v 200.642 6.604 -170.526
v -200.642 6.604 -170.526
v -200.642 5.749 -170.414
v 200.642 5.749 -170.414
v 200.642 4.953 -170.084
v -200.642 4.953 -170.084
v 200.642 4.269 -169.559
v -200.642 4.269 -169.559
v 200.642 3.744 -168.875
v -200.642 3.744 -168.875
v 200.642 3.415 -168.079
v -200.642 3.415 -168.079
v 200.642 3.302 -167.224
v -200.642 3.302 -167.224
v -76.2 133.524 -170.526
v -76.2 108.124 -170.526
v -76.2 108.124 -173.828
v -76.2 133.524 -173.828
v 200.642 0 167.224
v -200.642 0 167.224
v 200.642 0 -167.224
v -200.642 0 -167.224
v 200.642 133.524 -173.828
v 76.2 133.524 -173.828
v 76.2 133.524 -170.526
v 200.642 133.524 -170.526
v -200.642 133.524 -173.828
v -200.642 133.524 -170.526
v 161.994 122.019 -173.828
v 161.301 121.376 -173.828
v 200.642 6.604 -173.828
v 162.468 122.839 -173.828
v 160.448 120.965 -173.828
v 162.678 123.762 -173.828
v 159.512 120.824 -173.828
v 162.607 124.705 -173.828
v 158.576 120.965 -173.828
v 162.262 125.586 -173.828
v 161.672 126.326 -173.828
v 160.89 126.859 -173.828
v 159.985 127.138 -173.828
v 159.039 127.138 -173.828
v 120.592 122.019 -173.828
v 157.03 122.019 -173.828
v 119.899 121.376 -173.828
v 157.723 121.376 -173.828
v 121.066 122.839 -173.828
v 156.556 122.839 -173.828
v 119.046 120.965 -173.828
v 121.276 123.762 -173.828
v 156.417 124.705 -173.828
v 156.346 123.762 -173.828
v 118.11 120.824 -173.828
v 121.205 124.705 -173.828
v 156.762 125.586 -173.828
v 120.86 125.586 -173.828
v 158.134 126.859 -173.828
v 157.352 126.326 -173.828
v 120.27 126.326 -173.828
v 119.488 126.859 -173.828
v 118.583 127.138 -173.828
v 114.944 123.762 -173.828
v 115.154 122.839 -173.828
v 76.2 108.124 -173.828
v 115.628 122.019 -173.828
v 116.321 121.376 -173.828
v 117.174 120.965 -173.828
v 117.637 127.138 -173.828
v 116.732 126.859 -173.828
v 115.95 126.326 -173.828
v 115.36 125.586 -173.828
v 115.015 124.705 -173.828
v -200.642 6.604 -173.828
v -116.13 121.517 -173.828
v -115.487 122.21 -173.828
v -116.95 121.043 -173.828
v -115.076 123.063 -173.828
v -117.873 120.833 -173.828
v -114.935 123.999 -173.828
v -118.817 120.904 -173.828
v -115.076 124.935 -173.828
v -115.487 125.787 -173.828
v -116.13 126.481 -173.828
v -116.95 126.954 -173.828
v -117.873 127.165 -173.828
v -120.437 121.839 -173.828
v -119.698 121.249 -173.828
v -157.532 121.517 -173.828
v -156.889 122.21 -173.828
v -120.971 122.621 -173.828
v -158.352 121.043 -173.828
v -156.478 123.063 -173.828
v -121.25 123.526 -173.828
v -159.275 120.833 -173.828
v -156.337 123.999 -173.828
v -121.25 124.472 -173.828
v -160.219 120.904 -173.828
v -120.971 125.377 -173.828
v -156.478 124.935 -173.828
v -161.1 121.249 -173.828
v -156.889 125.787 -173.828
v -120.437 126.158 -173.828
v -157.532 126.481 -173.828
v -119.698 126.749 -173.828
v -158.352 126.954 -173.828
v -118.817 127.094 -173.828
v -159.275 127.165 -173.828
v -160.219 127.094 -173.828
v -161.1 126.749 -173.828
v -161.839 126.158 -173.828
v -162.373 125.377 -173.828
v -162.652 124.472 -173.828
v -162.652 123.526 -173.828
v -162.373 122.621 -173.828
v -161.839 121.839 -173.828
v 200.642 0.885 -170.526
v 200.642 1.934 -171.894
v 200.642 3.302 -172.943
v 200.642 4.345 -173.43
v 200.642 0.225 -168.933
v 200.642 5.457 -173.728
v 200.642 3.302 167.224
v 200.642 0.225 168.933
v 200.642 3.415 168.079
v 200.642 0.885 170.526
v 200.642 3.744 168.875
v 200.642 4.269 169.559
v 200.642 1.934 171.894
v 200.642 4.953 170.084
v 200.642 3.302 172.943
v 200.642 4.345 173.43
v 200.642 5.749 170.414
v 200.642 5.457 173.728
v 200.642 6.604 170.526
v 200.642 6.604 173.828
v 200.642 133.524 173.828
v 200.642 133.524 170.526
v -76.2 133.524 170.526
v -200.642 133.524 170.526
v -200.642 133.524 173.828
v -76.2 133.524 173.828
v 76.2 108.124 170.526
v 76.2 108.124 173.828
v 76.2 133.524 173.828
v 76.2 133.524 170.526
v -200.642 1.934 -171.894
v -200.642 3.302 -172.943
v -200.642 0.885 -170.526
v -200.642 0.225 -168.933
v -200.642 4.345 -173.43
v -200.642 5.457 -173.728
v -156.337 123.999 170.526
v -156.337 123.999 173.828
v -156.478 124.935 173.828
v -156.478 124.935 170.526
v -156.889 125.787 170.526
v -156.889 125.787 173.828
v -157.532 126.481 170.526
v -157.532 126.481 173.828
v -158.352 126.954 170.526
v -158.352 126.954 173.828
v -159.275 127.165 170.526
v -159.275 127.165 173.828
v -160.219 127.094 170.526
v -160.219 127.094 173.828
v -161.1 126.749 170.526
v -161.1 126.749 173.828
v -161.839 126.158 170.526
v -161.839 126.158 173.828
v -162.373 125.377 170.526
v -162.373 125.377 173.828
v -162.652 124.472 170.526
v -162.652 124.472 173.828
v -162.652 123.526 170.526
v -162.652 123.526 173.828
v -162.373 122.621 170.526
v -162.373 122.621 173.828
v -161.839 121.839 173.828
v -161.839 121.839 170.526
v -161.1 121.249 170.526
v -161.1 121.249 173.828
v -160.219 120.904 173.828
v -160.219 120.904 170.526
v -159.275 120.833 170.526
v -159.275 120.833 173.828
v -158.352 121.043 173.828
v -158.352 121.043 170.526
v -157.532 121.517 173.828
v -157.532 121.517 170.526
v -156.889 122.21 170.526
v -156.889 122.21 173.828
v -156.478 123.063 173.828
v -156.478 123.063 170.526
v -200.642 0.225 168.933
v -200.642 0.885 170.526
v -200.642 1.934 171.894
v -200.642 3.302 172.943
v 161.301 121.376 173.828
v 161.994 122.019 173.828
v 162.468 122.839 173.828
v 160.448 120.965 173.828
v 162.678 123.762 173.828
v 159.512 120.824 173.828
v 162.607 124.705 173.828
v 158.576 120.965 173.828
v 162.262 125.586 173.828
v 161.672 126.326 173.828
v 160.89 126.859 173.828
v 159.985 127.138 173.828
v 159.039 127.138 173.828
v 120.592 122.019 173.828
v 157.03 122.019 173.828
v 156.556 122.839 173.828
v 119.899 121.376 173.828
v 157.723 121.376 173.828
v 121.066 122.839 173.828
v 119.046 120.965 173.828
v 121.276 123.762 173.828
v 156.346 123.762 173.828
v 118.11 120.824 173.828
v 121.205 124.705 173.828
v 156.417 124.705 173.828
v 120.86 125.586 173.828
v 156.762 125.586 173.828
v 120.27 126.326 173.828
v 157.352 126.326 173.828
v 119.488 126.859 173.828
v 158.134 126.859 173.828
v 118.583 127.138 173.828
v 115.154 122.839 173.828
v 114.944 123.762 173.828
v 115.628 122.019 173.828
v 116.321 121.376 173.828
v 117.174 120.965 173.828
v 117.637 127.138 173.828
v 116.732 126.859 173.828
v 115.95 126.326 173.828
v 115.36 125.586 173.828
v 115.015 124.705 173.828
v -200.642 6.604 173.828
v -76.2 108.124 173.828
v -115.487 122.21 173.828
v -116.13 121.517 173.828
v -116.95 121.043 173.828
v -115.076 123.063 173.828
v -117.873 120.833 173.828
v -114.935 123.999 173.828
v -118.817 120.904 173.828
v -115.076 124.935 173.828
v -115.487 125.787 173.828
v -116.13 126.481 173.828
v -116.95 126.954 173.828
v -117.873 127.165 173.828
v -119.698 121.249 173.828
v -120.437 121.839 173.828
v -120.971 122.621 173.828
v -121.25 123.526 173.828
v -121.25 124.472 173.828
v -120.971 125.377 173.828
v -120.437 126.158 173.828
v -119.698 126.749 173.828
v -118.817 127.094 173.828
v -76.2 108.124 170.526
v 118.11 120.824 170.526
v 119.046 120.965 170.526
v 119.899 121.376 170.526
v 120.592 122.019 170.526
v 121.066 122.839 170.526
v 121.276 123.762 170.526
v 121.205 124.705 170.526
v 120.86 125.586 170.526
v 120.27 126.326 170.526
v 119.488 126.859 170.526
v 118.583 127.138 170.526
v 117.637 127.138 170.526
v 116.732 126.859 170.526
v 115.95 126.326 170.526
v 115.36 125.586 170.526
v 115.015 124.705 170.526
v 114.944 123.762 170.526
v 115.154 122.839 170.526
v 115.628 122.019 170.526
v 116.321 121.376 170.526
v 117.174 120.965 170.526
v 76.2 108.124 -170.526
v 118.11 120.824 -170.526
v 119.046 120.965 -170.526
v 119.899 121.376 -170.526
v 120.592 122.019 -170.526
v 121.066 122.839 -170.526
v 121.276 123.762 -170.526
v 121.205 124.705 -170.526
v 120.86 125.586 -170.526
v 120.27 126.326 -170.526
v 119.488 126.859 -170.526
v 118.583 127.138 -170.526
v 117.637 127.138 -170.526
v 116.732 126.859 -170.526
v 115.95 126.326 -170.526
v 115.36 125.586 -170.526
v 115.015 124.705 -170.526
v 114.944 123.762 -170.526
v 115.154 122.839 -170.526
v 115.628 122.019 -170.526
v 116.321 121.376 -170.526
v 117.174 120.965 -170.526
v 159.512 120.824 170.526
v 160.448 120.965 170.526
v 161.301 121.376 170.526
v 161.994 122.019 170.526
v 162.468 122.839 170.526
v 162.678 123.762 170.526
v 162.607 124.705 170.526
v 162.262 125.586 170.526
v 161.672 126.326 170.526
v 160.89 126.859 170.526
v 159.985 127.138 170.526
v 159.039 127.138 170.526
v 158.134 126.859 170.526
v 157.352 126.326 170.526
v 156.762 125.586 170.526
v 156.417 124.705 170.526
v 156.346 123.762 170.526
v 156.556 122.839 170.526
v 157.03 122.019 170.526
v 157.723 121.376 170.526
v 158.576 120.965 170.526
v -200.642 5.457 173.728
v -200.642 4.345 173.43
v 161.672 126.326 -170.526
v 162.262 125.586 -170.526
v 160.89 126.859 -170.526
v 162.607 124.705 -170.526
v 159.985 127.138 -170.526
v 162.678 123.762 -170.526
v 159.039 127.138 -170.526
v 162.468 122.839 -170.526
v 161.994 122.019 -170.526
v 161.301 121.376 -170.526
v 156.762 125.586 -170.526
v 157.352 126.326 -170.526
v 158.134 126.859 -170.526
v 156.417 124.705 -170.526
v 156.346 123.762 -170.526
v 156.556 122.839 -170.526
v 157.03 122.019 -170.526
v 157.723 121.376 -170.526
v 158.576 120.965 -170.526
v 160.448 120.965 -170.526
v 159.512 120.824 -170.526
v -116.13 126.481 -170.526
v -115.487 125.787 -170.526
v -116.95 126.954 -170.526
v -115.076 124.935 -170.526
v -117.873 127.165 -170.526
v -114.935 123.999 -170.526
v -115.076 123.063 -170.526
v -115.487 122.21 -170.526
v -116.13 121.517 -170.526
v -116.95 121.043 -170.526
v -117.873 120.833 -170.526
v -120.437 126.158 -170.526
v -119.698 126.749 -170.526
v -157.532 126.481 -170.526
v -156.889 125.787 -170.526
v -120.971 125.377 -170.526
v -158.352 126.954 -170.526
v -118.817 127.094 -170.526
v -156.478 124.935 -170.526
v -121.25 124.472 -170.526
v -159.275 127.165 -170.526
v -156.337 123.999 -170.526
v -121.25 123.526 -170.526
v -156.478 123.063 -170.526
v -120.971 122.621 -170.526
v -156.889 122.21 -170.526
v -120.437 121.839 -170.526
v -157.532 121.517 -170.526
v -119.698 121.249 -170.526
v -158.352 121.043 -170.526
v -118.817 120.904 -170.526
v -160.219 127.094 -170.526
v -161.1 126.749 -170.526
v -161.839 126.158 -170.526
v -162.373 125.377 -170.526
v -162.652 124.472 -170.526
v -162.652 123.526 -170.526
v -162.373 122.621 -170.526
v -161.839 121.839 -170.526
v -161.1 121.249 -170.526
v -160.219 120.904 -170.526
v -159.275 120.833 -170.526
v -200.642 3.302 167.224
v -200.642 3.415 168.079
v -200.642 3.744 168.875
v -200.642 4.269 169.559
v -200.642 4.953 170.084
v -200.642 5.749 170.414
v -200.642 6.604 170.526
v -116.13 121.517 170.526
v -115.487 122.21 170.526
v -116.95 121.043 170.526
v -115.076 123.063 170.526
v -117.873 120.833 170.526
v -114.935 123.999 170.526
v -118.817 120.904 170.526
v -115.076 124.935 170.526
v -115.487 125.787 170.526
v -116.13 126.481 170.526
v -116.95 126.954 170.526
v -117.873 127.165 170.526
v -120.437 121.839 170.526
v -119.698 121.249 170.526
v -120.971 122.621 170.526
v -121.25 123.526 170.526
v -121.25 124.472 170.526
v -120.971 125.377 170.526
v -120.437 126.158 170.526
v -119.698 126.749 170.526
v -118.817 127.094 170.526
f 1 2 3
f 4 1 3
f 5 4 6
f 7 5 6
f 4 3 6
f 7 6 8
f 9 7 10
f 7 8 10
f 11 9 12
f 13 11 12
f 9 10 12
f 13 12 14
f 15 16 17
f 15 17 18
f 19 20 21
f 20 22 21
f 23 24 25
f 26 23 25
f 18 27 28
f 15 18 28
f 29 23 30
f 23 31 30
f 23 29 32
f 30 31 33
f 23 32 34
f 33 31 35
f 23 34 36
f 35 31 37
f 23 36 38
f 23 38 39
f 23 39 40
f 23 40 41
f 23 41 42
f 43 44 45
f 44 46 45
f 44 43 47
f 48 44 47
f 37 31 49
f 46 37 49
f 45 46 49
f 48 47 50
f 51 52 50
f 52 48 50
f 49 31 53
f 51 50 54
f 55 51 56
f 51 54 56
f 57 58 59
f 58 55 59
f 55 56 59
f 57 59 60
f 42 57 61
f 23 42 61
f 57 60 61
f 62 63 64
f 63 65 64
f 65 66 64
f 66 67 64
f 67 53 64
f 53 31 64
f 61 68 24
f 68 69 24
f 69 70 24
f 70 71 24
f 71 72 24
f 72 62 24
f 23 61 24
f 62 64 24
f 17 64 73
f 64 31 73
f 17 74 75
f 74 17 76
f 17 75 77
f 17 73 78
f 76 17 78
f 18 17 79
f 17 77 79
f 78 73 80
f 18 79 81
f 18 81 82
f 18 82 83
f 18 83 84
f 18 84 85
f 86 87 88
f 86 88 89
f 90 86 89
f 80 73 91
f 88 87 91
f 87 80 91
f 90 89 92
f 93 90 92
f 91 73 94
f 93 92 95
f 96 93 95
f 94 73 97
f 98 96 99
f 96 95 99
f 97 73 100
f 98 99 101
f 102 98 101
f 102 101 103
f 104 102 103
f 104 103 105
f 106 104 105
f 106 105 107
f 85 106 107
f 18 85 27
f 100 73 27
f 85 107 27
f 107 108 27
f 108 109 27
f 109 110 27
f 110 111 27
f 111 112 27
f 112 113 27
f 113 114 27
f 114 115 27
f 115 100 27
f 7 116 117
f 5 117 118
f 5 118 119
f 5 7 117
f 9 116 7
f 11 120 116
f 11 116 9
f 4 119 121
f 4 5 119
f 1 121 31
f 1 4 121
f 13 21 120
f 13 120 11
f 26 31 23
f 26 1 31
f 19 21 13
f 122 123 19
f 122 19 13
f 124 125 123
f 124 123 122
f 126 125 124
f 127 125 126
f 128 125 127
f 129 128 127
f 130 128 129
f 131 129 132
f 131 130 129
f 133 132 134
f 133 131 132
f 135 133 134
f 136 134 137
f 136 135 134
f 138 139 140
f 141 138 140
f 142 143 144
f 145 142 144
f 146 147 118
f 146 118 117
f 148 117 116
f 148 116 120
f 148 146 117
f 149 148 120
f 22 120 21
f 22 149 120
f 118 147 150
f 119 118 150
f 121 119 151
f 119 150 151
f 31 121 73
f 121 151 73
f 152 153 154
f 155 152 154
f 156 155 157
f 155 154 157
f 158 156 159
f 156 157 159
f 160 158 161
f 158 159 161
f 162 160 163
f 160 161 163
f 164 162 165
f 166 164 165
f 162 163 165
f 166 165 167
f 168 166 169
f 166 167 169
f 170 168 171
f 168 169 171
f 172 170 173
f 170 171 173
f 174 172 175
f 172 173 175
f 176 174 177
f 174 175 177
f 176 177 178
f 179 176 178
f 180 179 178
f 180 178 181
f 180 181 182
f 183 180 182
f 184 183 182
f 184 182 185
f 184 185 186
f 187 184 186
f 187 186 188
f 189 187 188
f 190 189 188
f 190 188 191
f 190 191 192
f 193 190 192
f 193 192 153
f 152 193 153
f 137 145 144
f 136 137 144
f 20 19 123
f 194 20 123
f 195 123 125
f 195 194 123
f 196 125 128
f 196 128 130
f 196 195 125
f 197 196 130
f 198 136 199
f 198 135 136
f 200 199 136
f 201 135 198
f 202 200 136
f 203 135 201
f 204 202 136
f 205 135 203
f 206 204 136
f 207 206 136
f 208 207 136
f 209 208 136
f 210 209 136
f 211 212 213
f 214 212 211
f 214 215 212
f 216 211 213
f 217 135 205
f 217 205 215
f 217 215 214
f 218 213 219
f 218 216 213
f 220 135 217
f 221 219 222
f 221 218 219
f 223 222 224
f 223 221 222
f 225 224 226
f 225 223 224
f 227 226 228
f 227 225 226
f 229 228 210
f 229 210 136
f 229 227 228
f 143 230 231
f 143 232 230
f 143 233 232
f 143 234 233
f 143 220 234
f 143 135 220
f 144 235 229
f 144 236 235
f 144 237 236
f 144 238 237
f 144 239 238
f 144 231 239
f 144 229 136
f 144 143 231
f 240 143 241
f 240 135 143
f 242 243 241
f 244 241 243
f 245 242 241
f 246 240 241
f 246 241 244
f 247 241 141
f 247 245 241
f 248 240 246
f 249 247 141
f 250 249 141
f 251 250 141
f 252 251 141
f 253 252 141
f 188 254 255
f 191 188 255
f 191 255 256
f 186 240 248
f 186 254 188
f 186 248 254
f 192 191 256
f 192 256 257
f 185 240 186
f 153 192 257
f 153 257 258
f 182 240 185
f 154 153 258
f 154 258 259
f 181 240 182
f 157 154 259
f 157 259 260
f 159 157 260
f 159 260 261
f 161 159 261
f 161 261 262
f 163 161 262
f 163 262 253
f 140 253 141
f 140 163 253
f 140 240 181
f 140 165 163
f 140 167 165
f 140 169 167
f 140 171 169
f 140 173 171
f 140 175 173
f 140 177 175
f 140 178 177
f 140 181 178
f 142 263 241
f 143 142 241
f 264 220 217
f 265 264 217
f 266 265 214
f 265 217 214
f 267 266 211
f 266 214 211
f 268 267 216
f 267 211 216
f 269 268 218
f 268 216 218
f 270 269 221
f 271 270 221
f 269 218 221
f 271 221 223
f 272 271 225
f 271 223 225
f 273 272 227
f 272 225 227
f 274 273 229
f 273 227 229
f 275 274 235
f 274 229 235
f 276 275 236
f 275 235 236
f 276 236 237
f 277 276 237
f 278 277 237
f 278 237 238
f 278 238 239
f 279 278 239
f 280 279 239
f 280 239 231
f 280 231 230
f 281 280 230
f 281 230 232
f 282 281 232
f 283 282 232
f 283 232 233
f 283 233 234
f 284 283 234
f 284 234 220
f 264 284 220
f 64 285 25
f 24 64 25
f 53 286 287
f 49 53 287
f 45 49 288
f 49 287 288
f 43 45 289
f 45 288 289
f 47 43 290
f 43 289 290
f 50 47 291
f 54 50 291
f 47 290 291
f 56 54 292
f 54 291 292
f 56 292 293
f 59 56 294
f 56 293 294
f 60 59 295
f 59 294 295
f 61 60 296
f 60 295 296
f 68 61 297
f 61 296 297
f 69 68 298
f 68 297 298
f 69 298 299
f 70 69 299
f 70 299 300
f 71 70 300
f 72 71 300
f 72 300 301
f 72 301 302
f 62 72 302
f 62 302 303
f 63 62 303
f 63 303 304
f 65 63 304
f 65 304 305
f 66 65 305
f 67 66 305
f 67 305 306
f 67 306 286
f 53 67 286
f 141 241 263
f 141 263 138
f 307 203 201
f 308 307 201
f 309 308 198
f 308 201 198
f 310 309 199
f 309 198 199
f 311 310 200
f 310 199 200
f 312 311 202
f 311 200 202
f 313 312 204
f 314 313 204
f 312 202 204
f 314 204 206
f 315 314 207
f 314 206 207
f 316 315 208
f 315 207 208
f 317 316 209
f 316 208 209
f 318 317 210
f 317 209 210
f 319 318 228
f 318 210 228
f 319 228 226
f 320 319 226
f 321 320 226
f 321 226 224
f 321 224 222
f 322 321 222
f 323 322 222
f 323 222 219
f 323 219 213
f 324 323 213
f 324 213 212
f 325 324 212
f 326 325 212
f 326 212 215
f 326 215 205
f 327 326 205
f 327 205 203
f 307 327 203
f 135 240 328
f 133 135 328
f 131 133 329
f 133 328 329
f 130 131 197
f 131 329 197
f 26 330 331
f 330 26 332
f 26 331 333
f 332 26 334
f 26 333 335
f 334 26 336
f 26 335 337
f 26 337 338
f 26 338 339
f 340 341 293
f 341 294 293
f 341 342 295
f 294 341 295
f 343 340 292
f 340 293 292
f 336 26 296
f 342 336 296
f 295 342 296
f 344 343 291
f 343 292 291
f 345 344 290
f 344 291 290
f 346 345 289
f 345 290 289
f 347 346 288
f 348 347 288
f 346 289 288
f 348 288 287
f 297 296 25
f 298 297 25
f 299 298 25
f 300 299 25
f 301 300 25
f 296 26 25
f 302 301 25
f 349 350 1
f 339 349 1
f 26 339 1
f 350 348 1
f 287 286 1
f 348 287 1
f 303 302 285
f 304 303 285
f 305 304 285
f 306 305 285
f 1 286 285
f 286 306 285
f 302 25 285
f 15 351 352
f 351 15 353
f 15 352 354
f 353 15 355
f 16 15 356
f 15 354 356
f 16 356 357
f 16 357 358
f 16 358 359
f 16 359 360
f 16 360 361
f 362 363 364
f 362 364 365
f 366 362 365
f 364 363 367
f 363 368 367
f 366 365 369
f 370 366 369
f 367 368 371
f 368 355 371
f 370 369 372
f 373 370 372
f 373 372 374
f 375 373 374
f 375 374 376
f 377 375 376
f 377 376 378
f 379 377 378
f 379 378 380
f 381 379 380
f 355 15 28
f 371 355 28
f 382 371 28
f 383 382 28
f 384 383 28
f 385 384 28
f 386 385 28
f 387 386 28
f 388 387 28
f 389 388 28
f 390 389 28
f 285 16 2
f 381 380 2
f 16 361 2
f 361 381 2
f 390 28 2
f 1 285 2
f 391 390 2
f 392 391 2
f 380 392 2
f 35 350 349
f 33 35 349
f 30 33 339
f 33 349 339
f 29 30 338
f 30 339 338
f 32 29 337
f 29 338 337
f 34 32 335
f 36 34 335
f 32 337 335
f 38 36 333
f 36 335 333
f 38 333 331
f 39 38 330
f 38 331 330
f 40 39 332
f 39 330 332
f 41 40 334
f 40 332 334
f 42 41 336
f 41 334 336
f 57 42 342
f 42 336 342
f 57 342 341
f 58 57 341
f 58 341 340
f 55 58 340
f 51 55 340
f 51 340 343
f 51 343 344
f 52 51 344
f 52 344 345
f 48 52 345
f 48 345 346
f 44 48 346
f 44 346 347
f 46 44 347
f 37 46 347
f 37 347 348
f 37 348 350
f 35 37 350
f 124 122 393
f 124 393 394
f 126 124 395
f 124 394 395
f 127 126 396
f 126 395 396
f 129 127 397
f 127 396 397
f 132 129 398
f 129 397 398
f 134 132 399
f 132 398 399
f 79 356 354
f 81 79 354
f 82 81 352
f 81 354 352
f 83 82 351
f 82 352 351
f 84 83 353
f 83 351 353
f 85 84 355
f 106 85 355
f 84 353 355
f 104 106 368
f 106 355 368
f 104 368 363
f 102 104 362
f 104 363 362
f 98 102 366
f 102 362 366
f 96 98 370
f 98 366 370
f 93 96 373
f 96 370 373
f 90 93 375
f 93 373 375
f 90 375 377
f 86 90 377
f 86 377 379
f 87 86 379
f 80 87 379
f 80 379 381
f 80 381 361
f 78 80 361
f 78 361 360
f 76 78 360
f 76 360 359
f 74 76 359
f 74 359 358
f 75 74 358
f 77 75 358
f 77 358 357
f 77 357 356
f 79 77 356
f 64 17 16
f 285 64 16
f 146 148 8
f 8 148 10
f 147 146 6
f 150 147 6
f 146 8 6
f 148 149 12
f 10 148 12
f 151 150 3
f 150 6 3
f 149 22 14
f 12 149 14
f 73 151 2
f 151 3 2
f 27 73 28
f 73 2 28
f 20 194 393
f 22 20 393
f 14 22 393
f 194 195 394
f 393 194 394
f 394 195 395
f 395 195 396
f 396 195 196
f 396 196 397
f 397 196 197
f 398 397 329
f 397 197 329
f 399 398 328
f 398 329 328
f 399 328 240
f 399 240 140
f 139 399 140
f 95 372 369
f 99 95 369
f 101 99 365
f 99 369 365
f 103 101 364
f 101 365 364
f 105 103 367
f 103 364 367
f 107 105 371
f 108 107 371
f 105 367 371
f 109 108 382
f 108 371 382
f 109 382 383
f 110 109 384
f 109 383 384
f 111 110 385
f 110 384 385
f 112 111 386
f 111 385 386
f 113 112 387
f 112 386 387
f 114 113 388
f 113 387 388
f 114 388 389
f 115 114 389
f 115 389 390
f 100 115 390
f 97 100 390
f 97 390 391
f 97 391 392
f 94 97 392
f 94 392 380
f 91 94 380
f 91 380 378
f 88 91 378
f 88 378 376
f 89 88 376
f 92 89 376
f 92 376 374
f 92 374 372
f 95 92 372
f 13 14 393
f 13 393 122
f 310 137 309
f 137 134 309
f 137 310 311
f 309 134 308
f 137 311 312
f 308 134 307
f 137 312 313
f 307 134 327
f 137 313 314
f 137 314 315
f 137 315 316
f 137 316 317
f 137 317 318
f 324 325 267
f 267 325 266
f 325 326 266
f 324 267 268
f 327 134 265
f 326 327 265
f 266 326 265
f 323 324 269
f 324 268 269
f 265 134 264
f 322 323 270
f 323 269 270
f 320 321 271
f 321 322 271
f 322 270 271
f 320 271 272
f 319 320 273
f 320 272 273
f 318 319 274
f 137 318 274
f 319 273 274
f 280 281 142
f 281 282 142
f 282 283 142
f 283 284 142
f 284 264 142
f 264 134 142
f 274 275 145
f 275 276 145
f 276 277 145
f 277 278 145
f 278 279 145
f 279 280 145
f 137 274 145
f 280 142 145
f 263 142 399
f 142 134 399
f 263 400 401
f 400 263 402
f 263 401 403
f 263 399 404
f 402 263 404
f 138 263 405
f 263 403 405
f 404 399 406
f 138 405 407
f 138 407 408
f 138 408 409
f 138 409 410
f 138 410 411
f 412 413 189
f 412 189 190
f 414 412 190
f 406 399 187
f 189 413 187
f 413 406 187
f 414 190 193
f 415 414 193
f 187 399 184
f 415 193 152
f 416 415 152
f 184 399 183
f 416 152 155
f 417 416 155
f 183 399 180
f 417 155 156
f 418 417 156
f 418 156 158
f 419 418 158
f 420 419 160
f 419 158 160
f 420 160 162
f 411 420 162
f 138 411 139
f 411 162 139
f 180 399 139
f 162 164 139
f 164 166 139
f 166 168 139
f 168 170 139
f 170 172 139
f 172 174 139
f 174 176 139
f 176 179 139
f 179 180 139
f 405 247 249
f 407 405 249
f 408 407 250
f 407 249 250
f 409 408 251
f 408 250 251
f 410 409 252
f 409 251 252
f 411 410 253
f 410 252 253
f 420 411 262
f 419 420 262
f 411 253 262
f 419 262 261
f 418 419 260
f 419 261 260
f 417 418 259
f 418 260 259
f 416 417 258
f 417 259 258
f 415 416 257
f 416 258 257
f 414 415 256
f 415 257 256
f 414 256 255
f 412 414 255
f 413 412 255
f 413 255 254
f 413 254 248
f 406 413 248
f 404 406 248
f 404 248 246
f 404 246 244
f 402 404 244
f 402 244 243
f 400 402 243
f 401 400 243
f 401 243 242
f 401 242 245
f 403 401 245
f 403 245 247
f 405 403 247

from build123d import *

# Parameters (mm, degrees)
BASE_FLANGE1_DEPTH         = 3.302
SKETCHED_START             = -200.64222
SKETCHED_BEND1_DEPTH       = 401.28444
SKETCHED_BEND1_2_DEPTH     = 401.28444
SKETCHED_BEND1_3_OUTLINE_W = 25.4
SKETCHED_BEND1_3_OUTLINE_H = 3.302
SKETCHED_BEND1_3_DEPTH     = 124.44222
SKETCHED_START_2           = 76.2
SKETCHED_BEND1_4_OUTLINE_W = 25.4
SKETCHED_BEND1_4_OUTLINE_H = 3.302
SKETCHED_BEND1_4_DEPTH     = 124.44222
SKETCH15_R                 = 3.175
EXTRUDE2_DEPTH             = 424.025832199


# Read off the part's stored shape, not the designer's step: Sketched Bend1
# Sheet-metal steps are written as plain solids
with BuildPart() as part:
    # Sketch2 → Base-Flange1 (new body)
    with BuildSketch(Plane(origin=(0, 0, 0), x_dir=(1, 0, 0), z_dir=(0, 1, 0))):
        Polygon((200.64222, -301.9242367), (200.64222, 301.9242367), (76.2, 301.9242367), (76.2, 276.5242367), (-76.2, 276.5242367), (-76.2, 301.9242367), (-200.64222, 301.9242367), (-200.64222, -301.9242367), (-76.2, -301.9242367), (-76.2, -276.5242367), (76.2, -276.5242367), (76.2, -301.9242367), align=None)
    extrude(amount=BASE_FLANGE1_DEPTH)

    # Sketched Bend1 outline → Sketched Bend1 (cut)
    with BuildSketch(Plane.YZ.offset(SKETCHED_START)):
        with BuildLine():
            ThreePointArc((0, 167.224159597), (0.884768233, 170.526159597), (3.302, 172.943391364))
            Line((3.302, 172.943391364), (3.302, 301.9242367))
            Line((3.302, 301.9242367), (0, 301.9242367))
            Line((0, 301.9242367), (0, 167.224159597))
        make_face()
        with BuildLine():
            ThreePointArc((3.302, -172.943391364), (0.884768233, -170.526159597), (0, -167.224159597))
            Line((0, -167.224159597), (0, -301.9242367))
            Line((0, -301.9242367), (3.302, -301.9242367))
            Line((3.302, -301.9242367), (3.302, -172.943391364))
        make_face()
    extrude(amount=SKETCHED_BEND1_DEPTH, mode=Mode.SUBTRACT)

    # Sketched Bend1 2 outline → Sketched Bend1 2 (add)
    with BuildSketch(Plane.YZ.offset(SKETCHED_START)):
        with BuildLine():
            ThreePointArc((3.302, 167.224159597), (4.269133409, 169.559026188), (6.604, 170.526159597))
            Line((6.604, 170.526159597), (108.123922897, 170.526159597))
            Line((108.123922897, 170.526159597), (108.123922897, 173.828159597))
            Line((108.123922897, 173.828159597), (6.604, 173.828159597))
            ThreePointArc((6.604, 173.828159597), (4.894759026, 173.603133754), (3.302, 172.943391364))
            Line((3.302, 172.943391364), (3.302, 167.224159597))
        make_face()
        with BuildLine():
            ThreePointArc((6.604, -170.526159597), (4.269133409, -169.559026188), (3.302, -167.224159597))
            Line((3.302, -167.224159597), (3.302, -172.943391364))
            ThreePointArc((3.302, -172.943391364), (4.894759026, -173.603133754), (6.604, -173.828159597))
            Line((6.604, -173.828159597), (108.123922897, -173.828159597))
            Line((108.123922897, -173.828159597), (108.123922897, -170.526159597))
            Line((108.123922897, -170.526159597), (6.604, -170.526159597))
        make_face()
    extrude(amount=SKETCHED_BEND1_2_DEPTH)

    # Sketched Bend1 3 outline → Sketched Bend1 3 (add)
    with BuildSketch(Plane.YZ.offset(SKETCHED_START)):
        with Locations((120.823922897, 172.177159597)):
            Rectangle(SKETCHED_BEND1_3_OUTLINE_W, SKETCHED_BEND1_3_OUTLINE_H)
        with Locations((120.823922897, -172.177159597)):
            Rectangle(SKETCHED_BEND1_3_OUTLINE_W, SKETCHED_BEND1_3_OUTLINE_H)
    extrude(amount=SKETCHED_BEND1_3_DEPTH)

    # Sketched Bend1 4 outline → Sketched Bend1 4 (add)
    with BuildSketch(Plane.YZ.offset(SKETCHED_START_2)):
        with Locations((120.823922897, 172.177159597)):
            Rectangle(SKETCHED_BEND1_4_OUTLINE_W, SKETCHED_BEND1_4_OUTLINE_H)
        with Locations((120.823922897, -172.177159597)):
            Rectangle(SKETCHED_BEND1_4_OUTLINE_W, SKETCHED_BEND1_4_OUTLINE_H)
    extrude(amount=SKETCHED_BEND1_4_DEPTH)

    # Sketch15 → Extrude2 (cut, through all)
    with BuildSketch(Plane.XY.offset(173.828159597)):
        with Locations((-159.512, 123.998922897)):
            Circle(SKETCH15_R)
        with Locations((-118.11, 123.998922897)):
            Circle(SKETCH15_R)
        with Locations(Location((118.11, 123.998922897, 0), (0, 0, 270))):
            Circle(SKETCH15_R)
        with Locations(Location((159.512, 123.998922897, 0), (0, 0, 270))):
            Circle(SKETCH15_R)
    extrude(amount=-EXTRUDE2_DEPTH, mode=Mode.SUBTRACT)


solid = part.part
